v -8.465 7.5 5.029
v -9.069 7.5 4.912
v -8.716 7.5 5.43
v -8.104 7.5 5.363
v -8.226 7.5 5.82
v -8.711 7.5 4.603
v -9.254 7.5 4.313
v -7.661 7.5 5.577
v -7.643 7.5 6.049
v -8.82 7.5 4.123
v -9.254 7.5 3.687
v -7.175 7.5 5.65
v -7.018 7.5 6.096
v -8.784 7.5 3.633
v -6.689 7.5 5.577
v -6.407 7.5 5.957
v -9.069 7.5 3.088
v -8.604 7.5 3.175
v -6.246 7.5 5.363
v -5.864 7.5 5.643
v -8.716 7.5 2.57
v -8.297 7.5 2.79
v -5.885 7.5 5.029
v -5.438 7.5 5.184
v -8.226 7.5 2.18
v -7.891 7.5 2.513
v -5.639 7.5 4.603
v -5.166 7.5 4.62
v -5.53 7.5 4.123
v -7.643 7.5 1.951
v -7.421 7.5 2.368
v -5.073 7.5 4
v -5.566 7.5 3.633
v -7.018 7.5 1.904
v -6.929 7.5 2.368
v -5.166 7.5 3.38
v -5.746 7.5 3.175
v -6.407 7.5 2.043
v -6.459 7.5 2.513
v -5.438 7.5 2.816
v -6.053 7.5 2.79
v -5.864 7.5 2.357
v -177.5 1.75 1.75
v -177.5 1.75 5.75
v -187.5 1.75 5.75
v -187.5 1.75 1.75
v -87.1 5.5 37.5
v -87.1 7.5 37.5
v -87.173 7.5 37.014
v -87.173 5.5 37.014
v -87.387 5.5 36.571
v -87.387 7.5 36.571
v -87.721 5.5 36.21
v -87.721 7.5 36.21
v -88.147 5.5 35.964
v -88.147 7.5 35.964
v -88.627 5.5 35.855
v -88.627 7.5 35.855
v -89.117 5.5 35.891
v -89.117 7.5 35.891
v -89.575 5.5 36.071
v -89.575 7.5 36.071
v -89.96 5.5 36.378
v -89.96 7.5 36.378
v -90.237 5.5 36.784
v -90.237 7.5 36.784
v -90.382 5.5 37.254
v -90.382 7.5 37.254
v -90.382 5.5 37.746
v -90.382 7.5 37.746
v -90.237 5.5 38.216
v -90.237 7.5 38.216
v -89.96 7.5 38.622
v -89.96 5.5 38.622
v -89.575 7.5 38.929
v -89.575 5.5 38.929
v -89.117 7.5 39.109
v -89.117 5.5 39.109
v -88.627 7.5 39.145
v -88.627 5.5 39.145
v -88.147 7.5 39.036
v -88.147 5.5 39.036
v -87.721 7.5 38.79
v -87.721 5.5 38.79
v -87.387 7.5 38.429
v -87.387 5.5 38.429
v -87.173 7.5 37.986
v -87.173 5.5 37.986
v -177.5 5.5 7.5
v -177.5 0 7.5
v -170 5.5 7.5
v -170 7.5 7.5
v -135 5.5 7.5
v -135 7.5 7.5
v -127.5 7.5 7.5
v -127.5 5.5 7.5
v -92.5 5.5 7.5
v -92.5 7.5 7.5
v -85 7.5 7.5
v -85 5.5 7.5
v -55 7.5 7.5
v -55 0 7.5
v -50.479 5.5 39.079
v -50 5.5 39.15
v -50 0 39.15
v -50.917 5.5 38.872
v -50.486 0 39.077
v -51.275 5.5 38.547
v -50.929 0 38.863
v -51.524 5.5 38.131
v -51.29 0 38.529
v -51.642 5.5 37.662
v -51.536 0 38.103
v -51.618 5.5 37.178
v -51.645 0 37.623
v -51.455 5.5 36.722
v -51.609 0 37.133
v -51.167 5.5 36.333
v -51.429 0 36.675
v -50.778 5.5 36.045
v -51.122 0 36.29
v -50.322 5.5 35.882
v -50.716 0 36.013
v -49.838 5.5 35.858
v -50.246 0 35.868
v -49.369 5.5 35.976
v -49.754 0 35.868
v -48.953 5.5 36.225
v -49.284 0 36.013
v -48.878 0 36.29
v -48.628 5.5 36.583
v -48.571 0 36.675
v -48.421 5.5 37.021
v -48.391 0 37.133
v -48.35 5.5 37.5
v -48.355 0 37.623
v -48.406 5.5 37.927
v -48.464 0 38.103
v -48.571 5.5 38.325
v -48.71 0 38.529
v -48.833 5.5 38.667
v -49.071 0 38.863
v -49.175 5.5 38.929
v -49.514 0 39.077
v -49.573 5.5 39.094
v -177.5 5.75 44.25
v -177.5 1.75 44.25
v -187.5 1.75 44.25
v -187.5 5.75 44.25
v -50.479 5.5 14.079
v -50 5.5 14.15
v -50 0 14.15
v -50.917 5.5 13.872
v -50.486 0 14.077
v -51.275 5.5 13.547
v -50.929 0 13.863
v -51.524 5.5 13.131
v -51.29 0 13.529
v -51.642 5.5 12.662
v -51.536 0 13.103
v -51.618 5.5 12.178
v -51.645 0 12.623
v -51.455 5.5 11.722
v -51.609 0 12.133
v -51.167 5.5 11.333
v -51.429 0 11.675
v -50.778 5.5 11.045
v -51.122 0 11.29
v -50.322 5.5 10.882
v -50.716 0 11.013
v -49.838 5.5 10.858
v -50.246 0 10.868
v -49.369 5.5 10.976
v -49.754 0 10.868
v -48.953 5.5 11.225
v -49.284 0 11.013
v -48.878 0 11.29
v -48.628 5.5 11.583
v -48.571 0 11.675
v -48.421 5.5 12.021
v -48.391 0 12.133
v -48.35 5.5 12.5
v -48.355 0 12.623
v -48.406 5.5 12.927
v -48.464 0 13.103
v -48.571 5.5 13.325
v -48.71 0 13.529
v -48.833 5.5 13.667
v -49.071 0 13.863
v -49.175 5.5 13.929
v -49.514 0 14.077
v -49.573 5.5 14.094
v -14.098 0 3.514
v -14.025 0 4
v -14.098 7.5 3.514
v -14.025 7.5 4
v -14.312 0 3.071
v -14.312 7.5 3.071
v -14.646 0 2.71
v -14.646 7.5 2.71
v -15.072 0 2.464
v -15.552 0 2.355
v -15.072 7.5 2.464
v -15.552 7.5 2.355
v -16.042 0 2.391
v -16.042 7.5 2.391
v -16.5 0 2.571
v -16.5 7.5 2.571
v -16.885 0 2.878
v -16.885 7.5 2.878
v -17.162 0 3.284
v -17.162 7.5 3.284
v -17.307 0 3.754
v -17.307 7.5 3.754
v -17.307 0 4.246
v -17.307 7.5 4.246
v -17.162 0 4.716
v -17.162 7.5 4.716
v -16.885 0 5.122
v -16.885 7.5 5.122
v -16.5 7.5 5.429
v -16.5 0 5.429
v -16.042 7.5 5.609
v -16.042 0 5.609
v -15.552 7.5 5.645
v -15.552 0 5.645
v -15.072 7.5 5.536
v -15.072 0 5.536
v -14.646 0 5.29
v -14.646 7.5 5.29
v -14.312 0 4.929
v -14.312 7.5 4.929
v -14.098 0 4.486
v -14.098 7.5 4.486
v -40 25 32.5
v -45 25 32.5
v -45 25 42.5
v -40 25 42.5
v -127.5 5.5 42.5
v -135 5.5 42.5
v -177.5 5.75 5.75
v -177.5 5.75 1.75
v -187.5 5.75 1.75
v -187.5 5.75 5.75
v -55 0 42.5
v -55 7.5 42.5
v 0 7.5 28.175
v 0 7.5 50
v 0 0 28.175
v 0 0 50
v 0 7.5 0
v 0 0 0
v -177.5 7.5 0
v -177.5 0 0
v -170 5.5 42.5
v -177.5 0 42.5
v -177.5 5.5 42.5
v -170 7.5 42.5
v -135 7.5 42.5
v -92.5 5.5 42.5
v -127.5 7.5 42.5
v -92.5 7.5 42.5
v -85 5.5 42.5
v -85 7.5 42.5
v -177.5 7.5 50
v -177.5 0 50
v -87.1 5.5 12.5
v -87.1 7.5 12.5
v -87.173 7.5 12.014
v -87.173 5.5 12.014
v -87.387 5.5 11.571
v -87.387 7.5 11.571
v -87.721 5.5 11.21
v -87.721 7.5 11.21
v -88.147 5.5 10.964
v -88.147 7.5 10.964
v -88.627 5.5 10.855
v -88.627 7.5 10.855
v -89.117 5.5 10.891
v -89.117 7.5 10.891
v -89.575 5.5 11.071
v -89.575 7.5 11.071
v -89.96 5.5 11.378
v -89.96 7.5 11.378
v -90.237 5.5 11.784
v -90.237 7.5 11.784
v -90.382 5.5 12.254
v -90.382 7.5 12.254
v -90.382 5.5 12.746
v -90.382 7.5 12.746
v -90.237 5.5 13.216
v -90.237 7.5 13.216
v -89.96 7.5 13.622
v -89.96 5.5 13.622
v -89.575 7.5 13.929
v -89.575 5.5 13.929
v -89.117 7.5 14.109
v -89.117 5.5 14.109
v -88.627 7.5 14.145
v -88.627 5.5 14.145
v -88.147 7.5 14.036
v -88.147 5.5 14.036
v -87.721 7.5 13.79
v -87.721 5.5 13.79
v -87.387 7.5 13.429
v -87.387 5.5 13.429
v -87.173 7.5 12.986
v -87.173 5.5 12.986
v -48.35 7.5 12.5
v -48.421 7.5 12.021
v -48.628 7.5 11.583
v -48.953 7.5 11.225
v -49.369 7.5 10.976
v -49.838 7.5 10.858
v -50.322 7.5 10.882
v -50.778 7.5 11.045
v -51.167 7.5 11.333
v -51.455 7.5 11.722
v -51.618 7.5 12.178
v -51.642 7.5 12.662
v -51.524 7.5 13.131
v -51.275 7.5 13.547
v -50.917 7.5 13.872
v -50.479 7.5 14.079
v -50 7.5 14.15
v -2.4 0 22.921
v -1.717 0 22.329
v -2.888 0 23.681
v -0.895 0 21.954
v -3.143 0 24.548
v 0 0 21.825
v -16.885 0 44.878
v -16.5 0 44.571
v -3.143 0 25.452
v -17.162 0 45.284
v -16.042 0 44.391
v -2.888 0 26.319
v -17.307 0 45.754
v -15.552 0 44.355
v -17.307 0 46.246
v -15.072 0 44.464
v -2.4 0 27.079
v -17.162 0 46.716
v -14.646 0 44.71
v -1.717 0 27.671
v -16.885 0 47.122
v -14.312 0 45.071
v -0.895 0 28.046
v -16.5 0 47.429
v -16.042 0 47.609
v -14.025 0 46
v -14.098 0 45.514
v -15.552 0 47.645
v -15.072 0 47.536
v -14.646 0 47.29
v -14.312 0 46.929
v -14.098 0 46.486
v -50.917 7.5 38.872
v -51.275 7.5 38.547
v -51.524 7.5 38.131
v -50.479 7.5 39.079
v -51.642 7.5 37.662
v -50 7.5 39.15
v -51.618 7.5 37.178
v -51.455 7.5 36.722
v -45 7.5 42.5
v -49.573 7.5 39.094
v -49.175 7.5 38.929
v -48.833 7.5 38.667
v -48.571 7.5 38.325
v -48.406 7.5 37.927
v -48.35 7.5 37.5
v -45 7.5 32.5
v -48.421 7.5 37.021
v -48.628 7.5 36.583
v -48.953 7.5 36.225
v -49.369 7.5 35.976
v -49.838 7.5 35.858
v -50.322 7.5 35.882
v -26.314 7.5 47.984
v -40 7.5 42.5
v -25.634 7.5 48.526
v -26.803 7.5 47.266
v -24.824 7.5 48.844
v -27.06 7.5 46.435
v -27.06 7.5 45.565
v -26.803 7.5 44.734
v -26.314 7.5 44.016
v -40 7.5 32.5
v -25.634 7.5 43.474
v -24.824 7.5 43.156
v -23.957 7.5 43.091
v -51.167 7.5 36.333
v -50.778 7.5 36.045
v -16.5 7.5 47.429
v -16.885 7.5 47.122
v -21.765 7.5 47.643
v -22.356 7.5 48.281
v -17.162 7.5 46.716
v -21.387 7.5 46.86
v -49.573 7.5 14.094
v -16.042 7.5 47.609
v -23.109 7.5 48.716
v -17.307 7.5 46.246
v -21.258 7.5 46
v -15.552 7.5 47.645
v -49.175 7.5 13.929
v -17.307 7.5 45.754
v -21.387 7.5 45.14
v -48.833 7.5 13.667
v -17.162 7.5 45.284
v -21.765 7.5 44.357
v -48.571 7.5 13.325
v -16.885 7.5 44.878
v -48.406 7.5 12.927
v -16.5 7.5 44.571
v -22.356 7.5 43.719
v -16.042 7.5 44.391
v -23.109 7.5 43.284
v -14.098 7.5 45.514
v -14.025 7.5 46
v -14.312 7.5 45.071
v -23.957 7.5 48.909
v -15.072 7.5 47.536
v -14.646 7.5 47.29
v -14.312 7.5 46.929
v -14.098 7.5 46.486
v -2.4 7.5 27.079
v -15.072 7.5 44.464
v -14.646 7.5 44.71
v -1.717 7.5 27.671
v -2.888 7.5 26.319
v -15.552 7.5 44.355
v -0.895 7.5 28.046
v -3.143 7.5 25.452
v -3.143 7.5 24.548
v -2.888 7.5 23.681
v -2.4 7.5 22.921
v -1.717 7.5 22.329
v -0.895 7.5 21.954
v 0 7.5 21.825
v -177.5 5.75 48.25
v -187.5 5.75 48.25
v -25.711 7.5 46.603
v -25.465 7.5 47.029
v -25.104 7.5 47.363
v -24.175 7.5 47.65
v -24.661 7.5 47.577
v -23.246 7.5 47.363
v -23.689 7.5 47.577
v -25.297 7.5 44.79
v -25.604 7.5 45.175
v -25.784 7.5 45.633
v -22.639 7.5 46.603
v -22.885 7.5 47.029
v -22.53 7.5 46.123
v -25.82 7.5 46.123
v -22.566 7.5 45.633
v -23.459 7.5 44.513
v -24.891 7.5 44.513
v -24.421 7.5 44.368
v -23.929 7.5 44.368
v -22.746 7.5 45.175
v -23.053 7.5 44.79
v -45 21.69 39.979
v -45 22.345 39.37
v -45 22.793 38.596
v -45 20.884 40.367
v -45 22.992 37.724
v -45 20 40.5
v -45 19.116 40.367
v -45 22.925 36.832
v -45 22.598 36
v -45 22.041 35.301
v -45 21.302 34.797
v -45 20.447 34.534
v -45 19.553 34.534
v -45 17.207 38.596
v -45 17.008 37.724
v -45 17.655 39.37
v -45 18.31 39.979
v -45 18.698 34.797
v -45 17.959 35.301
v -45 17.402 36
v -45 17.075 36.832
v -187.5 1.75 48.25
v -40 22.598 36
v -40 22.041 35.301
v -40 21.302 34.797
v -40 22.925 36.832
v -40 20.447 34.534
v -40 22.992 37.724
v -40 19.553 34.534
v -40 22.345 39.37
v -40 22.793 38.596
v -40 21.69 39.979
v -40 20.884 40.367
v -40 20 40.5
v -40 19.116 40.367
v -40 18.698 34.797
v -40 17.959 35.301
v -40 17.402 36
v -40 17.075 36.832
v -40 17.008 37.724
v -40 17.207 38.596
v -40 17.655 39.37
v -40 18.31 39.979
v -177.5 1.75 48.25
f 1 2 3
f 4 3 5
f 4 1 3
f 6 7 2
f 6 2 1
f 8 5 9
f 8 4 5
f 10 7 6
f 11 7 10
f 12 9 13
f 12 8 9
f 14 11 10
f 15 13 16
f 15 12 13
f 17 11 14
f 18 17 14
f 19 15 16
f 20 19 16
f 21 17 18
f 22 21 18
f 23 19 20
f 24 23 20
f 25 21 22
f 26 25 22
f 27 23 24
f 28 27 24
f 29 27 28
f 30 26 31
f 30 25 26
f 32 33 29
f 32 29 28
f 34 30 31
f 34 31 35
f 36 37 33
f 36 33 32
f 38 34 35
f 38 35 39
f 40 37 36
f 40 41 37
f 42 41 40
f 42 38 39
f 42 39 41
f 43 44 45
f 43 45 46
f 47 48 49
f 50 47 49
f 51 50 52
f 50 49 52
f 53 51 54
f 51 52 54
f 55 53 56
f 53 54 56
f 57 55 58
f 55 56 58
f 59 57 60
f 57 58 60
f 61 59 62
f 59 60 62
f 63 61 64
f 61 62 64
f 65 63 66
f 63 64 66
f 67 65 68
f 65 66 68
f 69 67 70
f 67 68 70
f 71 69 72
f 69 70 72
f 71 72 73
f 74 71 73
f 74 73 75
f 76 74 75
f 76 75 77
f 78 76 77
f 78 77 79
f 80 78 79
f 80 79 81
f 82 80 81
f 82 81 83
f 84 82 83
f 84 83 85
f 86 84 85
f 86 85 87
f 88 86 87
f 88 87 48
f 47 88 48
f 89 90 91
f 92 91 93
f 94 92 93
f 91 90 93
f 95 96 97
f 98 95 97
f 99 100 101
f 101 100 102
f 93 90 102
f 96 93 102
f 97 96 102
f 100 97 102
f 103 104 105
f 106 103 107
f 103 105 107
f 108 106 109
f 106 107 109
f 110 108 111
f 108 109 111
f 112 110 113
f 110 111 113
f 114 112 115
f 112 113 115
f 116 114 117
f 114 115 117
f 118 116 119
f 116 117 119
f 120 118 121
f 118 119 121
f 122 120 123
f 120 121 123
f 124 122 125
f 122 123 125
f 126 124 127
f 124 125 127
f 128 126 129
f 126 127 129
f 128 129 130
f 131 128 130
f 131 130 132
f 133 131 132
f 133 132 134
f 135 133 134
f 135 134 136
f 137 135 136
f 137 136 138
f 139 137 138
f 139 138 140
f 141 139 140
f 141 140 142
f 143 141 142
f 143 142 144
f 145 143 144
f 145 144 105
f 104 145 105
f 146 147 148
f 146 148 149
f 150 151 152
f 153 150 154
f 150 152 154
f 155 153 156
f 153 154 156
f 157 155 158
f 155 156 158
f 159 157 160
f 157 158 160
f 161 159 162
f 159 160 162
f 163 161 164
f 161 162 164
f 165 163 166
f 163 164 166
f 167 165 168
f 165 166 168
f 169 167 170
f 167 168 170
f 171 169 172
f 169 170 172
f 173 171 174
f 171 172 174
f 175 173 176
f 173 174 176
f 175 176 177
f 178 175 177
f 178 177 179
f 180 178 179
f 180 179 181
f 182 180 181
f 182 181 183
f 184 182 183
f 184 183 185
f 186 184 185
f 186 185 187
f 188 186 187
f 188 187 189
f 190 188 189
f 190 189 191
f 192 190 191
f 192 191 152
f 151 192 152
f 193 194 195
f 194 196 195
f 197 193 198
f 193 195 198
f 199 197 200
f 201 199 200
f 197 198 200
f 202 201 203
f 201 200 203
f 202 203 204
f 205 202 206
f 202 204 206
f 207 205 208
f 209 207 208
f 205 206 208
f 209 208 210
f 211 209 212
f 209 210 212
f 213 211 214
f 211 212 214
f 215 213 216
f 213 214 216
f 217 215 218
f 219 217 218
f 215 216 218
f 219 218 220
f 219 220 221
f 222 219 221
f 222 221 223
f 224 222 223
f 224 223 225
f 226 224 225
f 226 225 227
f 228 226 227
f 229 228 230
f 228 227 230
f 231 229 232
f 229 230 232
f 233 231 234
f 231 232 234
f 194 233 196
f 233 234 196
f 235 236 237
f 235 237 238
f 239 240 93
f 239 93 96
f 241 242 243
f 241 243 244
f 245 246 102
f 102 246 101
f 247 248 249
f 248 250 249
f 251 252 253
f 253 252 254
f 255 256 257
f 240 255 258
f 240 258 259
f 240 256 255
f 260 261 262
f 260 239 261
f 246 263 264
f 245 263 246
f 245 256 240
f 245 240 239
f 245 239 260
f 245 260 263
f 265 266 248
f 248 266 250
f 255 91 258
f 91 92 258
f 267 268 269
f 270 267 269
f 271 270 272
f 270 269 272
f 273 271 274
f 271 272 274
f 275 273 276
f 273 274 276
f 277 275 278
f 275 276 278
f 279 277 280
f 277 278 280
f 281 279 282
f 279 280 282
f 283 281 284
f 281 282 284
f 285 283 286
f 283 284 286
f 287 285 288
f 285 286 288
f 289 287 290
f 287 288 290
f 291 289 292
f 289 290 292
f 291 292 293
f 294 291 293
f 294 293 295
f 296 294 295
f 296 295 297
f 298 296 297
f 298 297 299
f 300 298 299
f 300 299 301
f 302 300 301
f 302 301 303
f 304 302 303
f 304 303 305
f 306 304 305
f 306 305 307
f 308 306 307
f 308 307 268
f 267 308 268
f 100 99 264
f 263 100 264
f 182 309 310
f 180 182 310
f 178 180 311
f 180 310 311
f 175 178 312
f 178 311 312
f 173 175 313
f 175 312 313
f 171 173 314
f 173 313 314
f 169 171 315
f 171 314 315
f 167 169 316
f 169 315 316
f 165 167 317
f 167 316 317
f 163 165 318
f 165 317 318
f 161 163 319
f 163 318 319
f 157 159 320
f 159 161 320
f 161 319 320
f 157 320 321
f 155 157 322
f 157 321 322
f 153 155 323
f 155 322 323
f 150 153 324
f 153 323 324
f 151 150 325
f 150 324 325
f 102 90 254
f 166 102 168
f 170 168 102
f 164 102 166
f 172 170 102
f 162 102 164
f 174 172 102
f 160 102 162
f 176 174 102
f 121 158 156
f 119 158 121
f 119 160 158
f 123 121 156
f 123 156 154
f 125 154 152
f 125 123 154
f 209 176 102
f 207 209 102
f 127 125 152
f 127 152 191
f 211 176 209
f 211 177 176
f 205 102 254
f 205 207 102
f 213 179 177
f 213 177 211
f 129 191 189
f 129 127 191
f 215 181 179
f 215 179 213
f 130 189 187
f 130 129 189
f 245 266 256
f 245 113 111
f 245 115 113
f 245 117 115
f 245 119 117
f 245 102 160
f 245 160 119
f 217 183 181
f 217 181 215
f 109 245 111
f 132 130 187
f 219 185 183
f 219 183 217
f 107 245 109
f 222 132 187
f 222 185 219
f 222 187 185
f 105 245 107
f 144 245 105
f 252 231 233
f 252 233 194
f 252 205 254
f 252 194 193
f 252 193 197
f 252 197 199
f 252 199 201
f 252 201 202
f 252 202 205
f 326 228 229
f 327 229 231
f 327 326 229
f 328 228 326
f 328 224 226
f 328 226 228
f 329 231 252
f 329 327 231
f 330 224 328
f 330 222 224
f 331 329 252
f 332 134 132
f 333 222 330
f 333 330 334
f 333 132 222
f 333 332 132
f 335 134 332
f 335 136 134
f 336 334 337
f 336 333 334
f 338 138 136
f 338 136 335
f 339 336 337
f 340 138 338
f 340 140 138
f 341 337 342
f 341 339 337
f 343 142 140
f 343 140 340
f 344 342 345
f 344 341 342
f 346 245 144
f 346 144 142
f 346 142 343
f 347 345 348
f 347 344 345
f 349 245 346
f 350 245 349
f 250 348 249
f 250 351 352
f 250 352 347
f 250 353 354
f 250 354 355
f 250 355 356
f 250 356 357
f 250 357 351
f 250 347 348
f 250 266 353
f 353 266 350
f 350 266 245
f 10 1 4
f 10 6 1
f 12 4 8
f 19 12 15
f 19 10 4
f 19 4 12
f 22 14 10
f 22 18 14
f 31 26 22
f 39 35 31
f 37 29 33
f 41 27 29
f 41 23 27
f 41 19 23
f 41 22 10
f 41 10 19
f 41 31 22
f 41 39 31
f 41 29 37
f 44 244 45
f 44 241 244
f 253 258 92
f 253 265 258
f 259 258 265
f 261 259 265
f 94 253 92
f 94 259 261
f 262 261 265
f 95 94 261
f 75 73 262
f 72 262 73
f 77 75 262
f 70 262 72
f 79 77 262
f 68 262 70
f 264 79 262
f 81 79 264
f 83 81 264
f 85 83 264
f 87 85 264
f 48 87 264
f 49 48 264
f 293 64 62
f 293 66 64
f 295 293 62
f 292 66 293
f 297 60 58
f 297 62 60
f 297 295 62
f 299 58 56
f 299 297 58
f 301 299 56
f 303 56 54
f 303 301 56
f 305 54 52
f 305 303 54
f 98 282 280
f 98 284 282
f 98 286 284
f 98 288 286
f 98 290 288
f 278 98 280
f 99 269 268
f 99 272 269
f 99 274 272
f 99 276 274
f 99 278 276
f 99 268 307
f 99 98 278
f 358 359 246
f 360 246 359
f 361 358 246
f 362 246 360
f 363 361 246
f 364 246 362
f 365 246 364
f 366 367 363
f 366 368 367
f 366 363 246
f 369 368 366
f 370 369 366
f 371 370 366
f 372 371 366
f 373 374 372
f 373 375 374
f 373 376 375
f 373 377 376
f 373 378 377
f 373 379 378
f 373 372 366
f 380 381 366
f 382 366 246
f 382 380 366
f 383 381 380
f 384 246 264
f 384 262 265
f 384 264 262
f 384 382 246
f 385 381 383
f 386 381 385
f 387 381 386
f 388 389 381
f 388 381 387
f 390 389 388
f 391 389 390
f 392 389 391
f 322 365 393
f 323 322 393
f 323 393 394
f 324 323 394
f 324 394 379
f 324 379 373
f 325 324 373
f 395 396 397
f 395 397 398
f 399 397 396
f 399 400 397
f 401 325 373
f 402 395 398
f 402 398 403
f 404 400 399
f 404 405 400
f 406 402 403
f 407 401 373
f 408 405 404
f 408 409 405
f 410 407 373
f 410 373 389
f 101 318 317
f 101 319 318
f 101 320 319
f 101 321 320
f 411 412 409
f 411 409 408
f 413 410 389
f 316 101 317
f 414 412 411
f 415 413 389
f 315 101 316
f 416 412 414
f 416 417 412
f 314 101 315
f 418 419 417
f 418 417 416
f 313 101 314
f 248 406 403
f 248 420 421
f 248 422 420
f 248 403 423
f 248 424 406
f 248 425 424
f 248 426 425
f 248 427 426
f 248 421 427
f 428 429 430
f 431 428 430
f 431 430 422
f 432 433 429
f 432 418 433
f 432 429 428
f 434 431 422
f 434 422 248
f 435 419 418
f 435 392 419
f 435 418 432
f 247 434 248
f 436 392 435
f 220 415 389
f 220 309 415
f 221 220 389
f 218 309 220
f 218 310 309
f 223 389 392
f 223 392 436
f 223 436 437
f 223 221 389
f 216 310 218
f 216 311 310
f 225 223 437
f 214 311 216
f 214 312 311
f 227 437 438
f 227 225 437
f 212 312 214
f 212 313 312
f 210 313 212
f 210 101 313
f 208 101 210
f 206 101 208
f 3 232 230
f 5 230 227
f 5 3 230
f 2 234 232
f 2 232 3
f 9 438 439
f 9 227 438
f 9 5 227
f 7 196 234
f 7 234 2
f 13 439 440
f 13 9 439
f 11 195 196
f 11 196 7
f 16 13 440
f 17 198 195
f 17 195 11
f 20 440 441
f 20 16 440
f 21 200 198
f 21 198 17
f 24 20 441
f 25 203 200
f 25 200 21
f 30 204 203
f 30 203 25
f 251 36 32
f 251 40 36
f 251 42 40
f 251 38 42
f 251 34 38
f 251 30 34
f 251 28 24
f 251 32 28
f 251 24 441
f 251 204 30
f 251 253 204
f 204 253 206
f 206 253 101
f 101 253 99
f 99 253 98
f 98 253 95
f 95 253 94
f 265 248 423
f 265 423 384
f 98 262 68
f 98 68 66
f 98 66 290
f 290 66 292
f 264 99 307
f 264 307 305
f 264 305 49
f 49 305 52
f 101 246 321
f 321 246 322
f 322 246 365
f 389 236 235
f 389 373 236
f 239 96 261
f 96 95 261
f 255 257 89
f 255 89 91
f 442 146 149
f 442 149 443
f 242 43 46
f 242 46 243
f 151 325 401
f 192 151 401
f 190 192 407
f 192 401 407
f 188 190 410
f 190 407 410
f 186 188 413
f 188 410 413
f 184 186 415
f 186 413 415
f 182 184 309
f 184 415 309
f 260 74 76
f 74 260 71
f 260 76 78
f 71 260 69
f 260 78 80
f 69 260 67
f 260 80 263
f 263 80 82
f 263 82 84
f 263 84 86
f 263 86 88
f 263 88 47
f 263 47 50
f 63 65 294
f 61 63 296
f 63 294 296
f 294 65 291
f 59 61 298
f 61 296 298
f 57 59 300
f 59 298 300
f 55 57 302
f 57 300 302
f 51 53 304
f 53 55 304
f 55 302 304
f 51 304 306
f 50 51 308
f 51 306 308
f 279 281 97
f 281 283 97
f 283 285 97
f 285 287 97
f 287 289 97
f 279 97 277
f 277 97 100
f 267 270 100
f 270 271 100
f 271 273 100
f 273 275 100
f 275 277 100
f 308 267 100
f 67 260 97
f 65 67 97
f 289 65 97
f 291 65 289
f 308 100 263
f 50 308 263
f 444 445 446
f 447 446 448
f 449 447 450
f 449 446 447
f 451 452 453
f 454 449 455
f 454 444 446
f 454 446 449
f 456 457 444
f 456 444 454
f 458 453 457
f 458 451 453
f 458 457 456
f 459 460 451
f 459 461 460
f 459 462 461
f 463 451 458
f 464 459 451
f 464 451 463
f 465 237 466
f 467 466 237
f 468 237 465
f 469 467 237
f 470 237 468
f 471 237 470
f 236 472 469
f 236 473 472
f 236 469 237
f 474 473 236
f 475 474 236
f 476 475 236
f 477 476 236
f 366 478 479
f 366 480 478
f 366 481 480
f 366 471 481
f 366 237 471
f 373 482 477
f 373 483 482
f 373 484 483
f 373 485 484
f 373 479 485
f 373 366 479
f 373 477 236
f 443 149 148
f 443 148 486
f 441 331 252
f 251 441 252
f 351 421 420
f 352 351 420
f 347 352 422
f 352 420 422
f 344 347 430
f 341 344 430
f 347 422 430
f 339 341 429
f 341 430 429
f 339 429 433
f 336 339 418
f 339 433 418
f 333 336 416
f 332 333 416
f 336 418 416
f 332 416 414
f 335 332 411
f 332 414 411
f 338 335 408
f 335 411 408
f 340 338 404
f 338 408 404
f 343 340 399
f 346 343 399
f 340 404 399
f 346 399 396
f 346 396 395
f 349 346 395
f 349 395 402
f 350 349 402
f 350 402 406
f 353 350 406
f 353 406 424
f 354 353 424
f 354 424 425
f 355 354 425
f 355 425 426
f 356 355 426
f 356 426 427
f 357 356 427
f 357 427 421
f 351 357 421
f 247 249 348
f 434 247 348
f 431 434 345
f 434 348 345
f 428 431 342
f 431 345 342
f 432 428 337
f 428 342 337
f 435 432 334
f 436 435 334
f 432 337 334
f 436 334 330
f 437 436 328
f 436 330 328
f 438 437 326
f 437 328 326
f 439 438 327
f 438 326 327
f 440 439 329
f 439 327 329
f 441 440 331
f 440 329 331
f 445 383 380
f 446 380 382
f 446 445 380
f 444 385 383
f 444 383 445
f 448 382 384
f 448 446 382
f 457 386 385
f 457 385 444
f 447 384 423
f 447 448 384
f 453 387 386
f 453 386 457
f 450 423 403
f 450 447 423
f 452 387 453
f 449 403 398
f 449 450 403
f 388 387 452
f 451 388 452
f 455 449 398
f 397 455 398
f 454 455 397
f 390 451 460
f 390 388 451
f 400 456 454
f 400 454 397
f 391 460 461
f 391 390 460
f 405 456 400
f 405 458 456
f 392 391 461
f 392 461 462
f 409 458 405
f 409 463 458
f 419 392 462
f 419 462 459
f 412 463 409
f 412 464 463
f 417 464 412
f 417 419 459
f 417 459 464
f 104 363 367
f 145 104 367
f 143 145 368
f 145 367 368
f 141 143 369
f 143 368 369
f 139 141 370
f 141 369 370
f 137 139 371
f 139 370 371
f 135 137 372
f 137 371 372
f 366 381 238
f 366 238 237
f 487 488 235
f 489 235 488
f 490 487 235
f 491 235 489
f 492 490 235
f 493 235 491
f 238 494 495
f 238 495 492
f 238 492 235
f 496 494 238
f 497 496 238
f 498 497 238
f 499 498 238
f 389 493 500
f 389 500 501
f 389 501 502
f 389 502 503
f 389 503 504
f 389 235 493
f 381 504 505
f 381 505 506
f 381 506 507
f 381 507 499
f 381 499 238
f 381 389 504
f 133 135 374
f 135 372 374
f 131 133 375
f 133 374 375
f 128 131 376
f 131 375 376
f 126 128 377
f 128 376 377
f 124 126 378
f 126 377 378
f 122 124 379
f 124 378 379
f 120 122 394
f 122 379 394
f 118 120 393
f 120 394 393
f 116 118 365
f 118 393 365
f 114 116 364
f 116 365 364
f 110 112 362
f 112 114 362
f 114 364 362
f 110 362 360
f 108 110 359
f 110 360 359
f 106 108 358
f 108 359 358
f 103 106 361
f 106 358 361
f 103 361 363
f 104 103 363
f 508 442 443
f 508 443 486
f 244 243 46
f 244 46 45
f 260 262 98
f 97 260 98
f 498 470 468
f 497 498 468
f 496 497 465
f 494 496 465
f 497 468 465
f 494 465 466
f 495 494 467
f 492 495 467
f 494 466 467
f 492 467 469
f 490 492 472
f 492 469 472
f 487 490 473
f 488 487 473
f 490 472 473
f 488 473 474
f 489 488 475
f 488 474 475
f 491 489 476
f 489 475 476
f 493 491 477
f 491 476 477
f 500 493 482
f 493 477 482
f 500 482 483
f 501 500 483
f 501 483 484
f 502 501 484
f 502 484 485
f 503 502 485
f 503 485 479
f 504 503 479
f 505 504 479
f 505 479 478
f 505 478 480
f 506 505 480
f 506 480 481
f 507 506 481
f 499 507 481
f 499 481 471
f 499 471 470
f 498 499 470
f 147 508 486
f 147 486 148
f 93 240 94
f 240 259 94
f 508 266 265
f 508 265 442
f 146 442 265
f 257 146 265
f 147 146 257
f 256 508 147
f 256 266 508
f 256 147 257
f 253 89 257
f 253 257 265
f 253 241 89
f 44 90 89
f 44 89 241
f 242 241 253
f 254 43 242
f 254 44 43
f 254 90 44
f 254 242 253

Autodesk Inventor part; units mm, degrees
ref_plane "YZ Plane" through (0, 0, 0) normal (1, 0, 0) x (0, 1, 0)
ref_plane "XZ Plane" through (0, 0, 0) normal (0, 1, 0) x (-1, 0, 0)
ref_plane "XY Plane" through (0, 0, 0) normal (0, 0, 1) x (1, 0, 0)
sketch "Sketch1" plane through (0, 0, 0) normal (0, 1, 0) x (-1, 0, 0)
  line L0 (0, 0) -> (50, 0)
  line L1 (50, 0) -> (50, 50)
  line L2 (50, 50) -> (0, 50)
  line L3 (0, 50) -> (0, 0)
  line L4 (50, 50) -> (290, 50)
  line L5 (290, 50) -> (290, 42.5)
  line L6 (290, 42.5) -> (50, 42.5)
  line L7 (50, 42.5) -> (50, 50)
  line L8 (50, 0) -> (290, 0)
  line L9 (290, 0) -> (290, 7.5)
  line L10 (290, 7.5) -> (50, 7.5)
  line L11 (50, 7.5) -> (50, 0)
  dimension "d0" = 50
  dimension "d1" = 50
  dimension "d2" = 240
  dimension "d3" = 7.5
  dimension "d4" = 7.5
extrude "Extrusion1" add sketch "Sketch1" along normal blind 7.5
sketch "Sketch2" plane through (0, 7.5, 0) normal (0, 1, 0) x (1, 0, 0)
  line L0 (0, -50) -> (0, 0) projected
  point P0 (0, -25)
hole "Hole1" at (0, 7.5, 25) direction (0, -1, 0) diameter 6.35 end through all
sketch "Sketch3" plane through (0, 7.5, 0) normal (0, 1, 0) x (1, 0, 0)
  line L0 (-3.175, -50) -> (-3.175, 0) construction
  line L1 (-3.175, -50) -> (-28.175, -50) construction
  line L2 (-28.175, -50) -> (-28.175, 0) construction
  line L3 (-28.175, 0) -> (-3.175, 0) construction
  point P0 (0, 0)
  point P1 (-7.175, -4)
  point P2 (-24.175, -46)
  dimension "d14" = 25
hole "Hole2" at (-7.175, 7.5, 4) at (-24.175, 7.5, 46) direction (0, -1, 0) diameter 3.3 end through all
sketch "Sketch4" plane through (0, 7.5, 0) normal (0, 1, 0) x (1, 0, 0)
  arc A0 (0, -21.825) -> (0, -28.175) centre (0, -25) ccw construction
  line L0 (-3.175, -25) -> (-28.175, -25) construction
  line L1 (-3.175, -25) -> (21.825, -25) construction
  line L2 (-290, -50) -> (0, -50) construction
  line L3 (-28.175, -50) -> (-28.175, 0) construction
  line L4 (-50, -7.5) -> (-50, -42.5) construction
  line L5 (-50, -42.5) -> (-45, -42.5) construction
  line L6 (-45, -42.5) -> (-45, -32.5) construction
  line L7 (-45, -32.5) -> (-50, -32.5) construction
  line L8 (-50, -32.5) -> (-50, -42.5) construction
  line L9 (-45, -32.5) -> (-40, -32.5)
  line L10 (-40, -32.5) -> (-40, -42.5)
  line L11 (-40, -42.5) -> (-45, -42.5)
  line L12 (-45, -42.5) -> (-45, -32.5)
  point P0 (0, 0)
  dimension "d22" = 25
  dimension "d23" = 180
  dimension "d24" = 5
  dimension "d25" = 10
  dimension "d26" = 5
extrude "Extrusion2" add sketch "Sketch4" along normal blind 17.5
sketch "Sketch5" plane through (0, 7.5, 0) normal (0, 1, 0) x (1, 0, 0)
  line L0 (-85, -7.5) -> (-85, -42.5)
  line L1 (-127.5, -7.5) -> (-127.5, -42.5)
  line L2 (-92.5, -42.5) -> (-92.5, -7.5)
  line L3 (-135, -7.5) -> (-170, -7.5) construction
  line L4 (-170, -7.5) -> (-170, -42.5) construction
  line L5 (-170, -42.5) -> (-135, -42.5) construction
  line L6 (-135, -42.5) -> (-135, -7.5) construction
  line L7 (-177.5, -7.5) -> (-212.5, -7.5) construction
  line L8 (-212.5, -7.5) -> (-212.5, -42.5) construction
  line L9 (-212.5, -42.5) -> (-177.5, -42.5) construction
  line L10 (-177.5, -42.5) -> (-177.5, -7.5) construction
  line L11 (-220, -7.5) -> (-255, -7.5) construction
  line L12 (-255, -7.5) -> (-255, -42.5) construction
  line L13 (-255, -42.5) -> (-220, -42.5) construction
  line L14 (-220, -42.5) -> (-220, -7.5) construction
  line L15 (-85, -7.5) -> (-92.5, -7.5) construction
  line L16 (-92.5, -7.5) -> (-92.5, -42.5) construction
  line L17 (-92.5, -42.5) -> (-85, -42.5) construction
  line L18 (-85, -42.5) -> (-85, -7.5) construction
  line L19 (-127.5, -7.5) -> (-135, -7.5) construction
  line L20 (-135, -7.5) -> (-135, -42.5) construction
  line L21 (-135, -42.5) -> (-127.5, -42.5) construction
  line L22 (-127.5, -42.5) -> (-127.5, -7.5) construction
  line L23 (-170, -7.5) -> (-177.5, -7.5) construction
  line L24 (-177.5, -7.5) -> (-177.5, -42.5) construction
  line L25 (-177.5, -42.5) -> (-170, -42.5) construction
  line L26 (-170, -42.5) -> (-170, -7.5) construction
  line L27 (-212.5, -7.5) -> (-220, -7.5) construction
  line L28 (-220, -7.5) -> (-220, -42.5) construction
  line L29 (-220, -42.5) -> (-212.5, -42.5) construction
  line L30 (-212.5, -42.5) -> (-212.5, -7.5) construction
  line L31 (-220, -7.5) -> (-212.5, -7.5)
  line L32 (-212.5, -7.5) -> (-212.5, -42.5)
  line L33 (-212.5, -42.5) -> (-220, -42.5)
  line L34 (-220, -42.5) -> (-220, -7.5)
  line L35 (-177.5, -7.5) -> (-170, -7.5)
  line L36 (-170, -7.5) -> (-170, -42.5)
  line L37 (-170, -42.5) -> (-177.5, -42.5)
  line L38 (-177.5, -42.5) -> (-177.5, -7.5)
  line L39 (-135, -7.5) -> (-127.5, -7.5)
  line L40 (-127.5, -7.5) -> (-127.5, -42.5)
  line L41 (-127.5, -42.5) -> (-135, -42.5)
  line L42 (-135, -42.5) -> (-135, -7.5)
  line L43 (-92.5, -7.5) -> (-85, -7.5)
  line L44 (-85, -7.5) -> (-85, -42.5)
  line L45 (-85, -42.5) -> (-92.5, -42.5)
  line L46 (-92.5, -42.5) -> (-92.5, -7.5)
  point P0 (0, 0)
  point P1 (-50, -7.5)
  dimension "d30" = 35
  dimension "d31" = 35
  dimension "d32" = 35
  dimension "d33" = 35
  dimension "d34" = 35
  dimension "d35" = 35
extrude "Extrusion3" add sketch "Sketch5" against normal blind 2
sketch "Sketch6" plane through (0, 7.5, 0) normal (0, 1, 0) x (1, 0, 0)
  line L0 (-290, 0) -> (-290, -7.5) projected
  line L1 (-290, -50) -> (0, -50) projected
  line L2 (-290, 0) -> (-280, 0)
  line L3 (-280, 0) -> (-280, -50)
  line L4 (-280, -50) -> (-290, -50)
  line L5 (-290, -50) -> (-290, 0)
  point P0 (0, 0)
  dimension "d38" = 10
extrude "Extrusion4" cut sketch "Sketch6" against normal blind 7.5
sketch "Sketch7" plane through (-280, 7.5, 0) normal (-1, 0, 0) x (0, 0, 1)
  point P0 (0, -7.5)
sketch "Sketch8" plane through (-280, 7.5, 0) normal (-1, 0, 0) x (0, 0, 1)
  line L0 (-25, 0) -> (75, 0)
  line L1 (75, 0) -> (75, -7.5)
  line L2 (75, -7.5) -> (-25, -7.5)
  line L3 (-25, -7.5) -> (-25, 0)
  line L4 (-25, 0) -> (75, 0)
  line L5 (75, 0) -> (75, -10)
  line L6 (75, -10) -> (-25, -10)
  line L7 (-25, -10) -> (-25, 0)
  point P0 (0, -7.5)
  dimension "d41" = 100
  dimension "d42" = 10
extrude "Extrusion5" add sketch "Sketch8" along normal blind 7.5
sketch "Sketch9" plane through (-287.5, 7.5, 0) normal (-1, 0, 0) x (0, 0, 1)
  line L0 (75, 0) -> (-25, 0) projected
  line L1 (-25, -10) -> (75, -10) projected
  line L2 (-25, 0) -> (-17.5, 0)
  line L3 (-17.5, 0) -> (-17.5, -10)
  line L4 (-17.5, -10) -> (-25, -10)
  line L5 (-25, -10) -> (-25, 0)
  line L6 (75, 0) -> (67.5, 0)
  line L7 (67.5, 0) -> (67.5, -10)
  line L8 (67.5, -10) -> (75, -10)
  line L9 (75, -10) -> (75, 0)
  point P0 (0, -7.5)
  dimension "d45" = 7.5
  dimension "d46" = 7.5
extrude "Extrusion6" add sketch "Sketch9" along normal blind 25 contours L9 L1 L7 L0 | L3 L1 L5 L0
sketch "Sketch10" plane through (-287.5, -2.5, -17.5) normal (0, 0, 1) x (1, 0, 0)
  line L0 (0, 0) -> (-25, 0) construction
  line L1 (0, 0) -> (-3, 0) construction
  line L2 (-3, 0) -> (-6.2, 0)
  line L3 (-6.2, 0) -> (-6.2, 2.1)
  line L4 (-6.2, 2.1) -> (-3, 2.1)
  line L5 (-3, 2.1) -> (-3, 0)
  line L6 (-6.2, 2.1) -> (-11.7, 2.1) construction
  line L7 (-11.7, 2.1) -> (-11.7, 5.4) construction
  point P0 (287.5, 2.5)
  dimension "d49" = 3
  dimension "d50" = 3.2
  dimension "d51" = 2.1
  dimension "d52" = 5.5
  dimension "d53" = 3.3
extrude "Extrusion7" add sketch "Sketch10" along normal blind 92.5
sketch "Sketch11" plane through (-287.5, -2.5, -17.5) normal (0, 0, 1) x (1, 0, 0)
  line L0 (-6.2, 2.1) -> (-3, 2.1) construction
  line L1 (-6.2, 2.1) -> (-11.7, 2.1) construction
  line L2 (-11.7, 2.1) -> (-11.7, 5.4) construction
  circle A0 centre (-11.7, 5.4) radius 2.125
  point P0 (287.5, 2.5)
  dimension "d56" = 5.5
  dimension "d57" = 3.3
  dimension "d58" = 4.25
extrude "Extrusion8" cut sketch "Sketch11" along normal mid plane 241
sketch "Sketch12" plane through (-287.5, -2.5, -17.5) normal (0, 0, 1) x (1, 0, 0)
  circle A0 centre (-11.7, 5.4) radius 2.125 construction
  line L0 (-11.7, 5.4) -> (-11.7, 0.96) construction
  line L1 (-11.7, 0.96) -> (-16.7, 0.96) construction
  line L2 (-6.2, 0) -> (-25, 0) projected
  line L3 (-16.7, 0.96) -> (-19.2, 0.96)
  line L4 (-19.2, 0.96) -> (-19.2, 0)
  line L5 (-19.2, 0) -> (-16.7, 0)
  line L6 (-16.7, 0) -> (-16.7, 0.96)
  point P0 (287.5, 2.5)
  dimension "d61" = 4.44
  dimension "d62" = 5
  dimension "d63" = 2.5
extrude "Extrusion9" add sketch "Sketch12" along normal blind 91.25
sketch "Sketch13" plane through (-293.7, -0.4, -17.5) normal (0, 1, 0) x (1, 0, 0)
  line L0 (3.2, 0) -> (3.2, -85) construction
  line L1 (3.2, 0) -> (3.2, -30) construction
  line L2 (0, 0) -> (0, -85) construction
  line L3 (3.2, -30) -> (0, -30) construction
  line L4 (0, -30) -> (0, -36.35) construction
  line L5 (0, -36.35) -> (3.2, -36.35) construction
  line L6 (3.2, -36.35) -> (3.2, -30) construction
  line L7 (0, -30) -> (3.2, -30)
  line L8 (3.2, -30) -> (3.2, -36.35)
  line L9 (3.2, -36.35) -> (0, -36.35)
  line L10 (0, -36.35) -> (0, -30)
  point P0 (293.7, -17.5)
  dimension "d66" = 30
  dimension "d67" = 6.35
extrude "Extrusion10" add sketch "Sketch13" along normal blind 3.8
sketch "Sketch14" plane through (0, 7.5, 0) normal (0, 1, 0) x (1, 0, 0)
  line L0 (-287.5, 17.5) -> (-287.5, -67.5) projected
  line L1 (-287.5, 17.5) -> (-285, 17.5)
  line L2 (-285, 17.5) -> (-285, -67.5)
  line L3 (-285, -67.5) -> (-287.5, -67.5)
  line L4 (-287.5, -67.5) -> (-287.5, 17.5)
  point P0 (0, 0)
  dimension "d70" = 2.5
extrude "Extrusion11" cut sketch "Sketch14" against normal blind 14.55
sketch "Sketch15" plane through (0, 7.5, 0) normal (0, 1, 0) x (1, 0, 0)
  line L0 (-312.5, 17.5) -> (-312.5, 25) projected
  line L1 (-280, -75) -> (-312.5, -75) projected
  line L2 (-312.5, 25) -> (-306.6488, 25)
  line L3 (-306.6488, 25) -> (-306.6488, -75)
  line L4 (-306.6488, -75) -> (-312.5, -75)
  line L5 (-312.5, -75) -> (-312.5, 25)
  point P0 (0, 0)
extrude "Extrusion12" cut sketch "Sketch15" against normal blind 14.55
fillet "Fillet1" radius 0.1 1 edges at (-301.325, 2.9, -17.5)
fillet "Fillet2" radius 0.1 1 edges at (-301.325, 2.9, 67.5)
fillet "Fillet3" radius 3.25 1 edges at (-280, 2.5, 75)
fillet "Fillet4" radius 3.25 1 edges at (-285, 2.5, 67.5)
fillet "Fillet5" radius 3.25 1 edges at (-280, 2.5, -25)
fillet "Fillet6" radius 3.25 1 edges at (-285, 2.5, -17.5)
sketch "Sketch16" plane through (0, 7.5, 0) normal (0, 1, 0) x (1, 0, 0)
  line L0 (-220, -42.5) -> (-220, -7.5) construction
  line L1 (-220, -42.5) -> (-280, -42.5) construction
  line L2 (-220, -7.5) -> (-255, -7.5) construction
  line L3 (-255, -7.5) -> (-255, -42.5) construction
  line L4 (-255, -42.5) -> (-220, -42.5) construction
  line L5 (-220, -42.5) -> (-220, -7.5) construction
  line L6 (-280, -7.5) -> (-280, 0) projected
  line L7 (-280, -7.5) -> (-270, -7.5)
  line L8 (-270, -7.5) -> (-270, -42.5)
  line L9 (-270, -42.5) -> (-280, -42.5)
  line L10 (-280, -42.5) -> (-280, -7.5)
  point P0 (0, 0)
  dimension "d81" = 35
  dimension "d82" = 10
extrude "Extrusion13" add sketch "Sketch16" against normal blind 2
sketch "Sketch17" plane through (0, 7.5, 0) normal (0, 1, 0) x (1, 0, 0)
  point P0 (0, 0)
sketch "Sketch18" plane through (0, 7.5, 0) normal (0, 1, 0) x (1, 0, 0)
  line L0 (-270, -7.5) -> (-270, -42.5) construction
  line L1 (-285, -64.25) -> (-285, 14.25) construction
  line L2 (-280, -7.5) -> (-280, 0) construction
  line L3 (-270, -7.5) -> (-280, -7.5) construction
  line L4 (-275, -7.5) -> (-275, -42.5) construction
  line L5 (-50, -42.5) -> (-280, -42.5) construction
  circle A0 centre (-275, -12.5) radius 1.8 construction
  circle A1 centre (-275, -37.5) radius 1.8 construction
  circle A2 centre (-275, -12.5) radius 1.8
  circle A3 centre (-275, -37.5) radius 1.8
  point P0 (0, 0)
  dimension "d85" = 3.6
  dimension "d86" = 3.6
hole "Hole3" at (-275, 7.5, 12.5) at (-275, 7.5, 37.5) direction (0, -1, 0) diameter 3.3 depth 15 tip angle 118
sketch "Sketch19" plane through (0, 7.5, 0) normal (0, 1, 0) x (1, 0, 0)
  circle A0 centre (-275, -12.5) radius 1.65 construction
  line L0 (-275, -12.5) -> (-212.5, -12.5) construction
  line L1 (-212.5, -7.5) -> (-212.5, -42.5) construction
  circle A1 centre (-275, -37.5) radius 1.65 construction
  line L2 (-275, -37.5) -> (-212.5, -37.5) construction
  line L3 (-220, -42.5) -> (-220, -7.5) construction
  line L4 (-220, -12.5) -> (-212.5, -12.5) construction
  line L5 (-216.25, -12.5) -> (-216.25, -37.5) construction
  point P0 (0, 0)
hole "Hole4" at (-216.25, 7.5, 12.5) at (-216.25, 7.5, 37.5) direction (0, -1, 0) diameter 3.3 depth 15 tip angle 118
sketch "Sketch20" plane through (-45, 7.5, 32.5) normal (-1, 0, 0) x (0, 0, 1)
  line L0 (10, 17.5) -> (0, 17.5) construction
  line L1 (5, 17.5) -> (5, -0.1335) construction
  line L2 (10, 0) -> (10, 17.5) construction
  line L3 (10, 12.5) -> (5, 12.5) construction
  circle A0 centre (5, 12.5) radius 3
  point P0 (-32.5, -7.5)
  dimension "d101" = 6
extrude "Extrusion14" cut sketch "Sketch20" against normal blind 20
sketch "Sketch21" plane through (0, 7.5, 0) normal (0, 1, 0) x (1, 0, 0)
  line L0 (-306.6488, 17.5) -> (-306.6488, -67.5) projected
  line L1 (-306.6488, 17.5) -> (-288.25, 17.5) projected
  line L2 (-306.6488, -67.5) -> (-288.25, -67.5)
  line L3 (-288.25, -67.5) -> (-288.25, 17.5)
  line L4 (-288.25, 17.5) -> (-306.6488, 17.5)
  line L5 (-306.6488, 17.5) -> (-306.6488, -67.5)
  point P0 (0, 0)
extrude "Extrusion15" cut sketch "Sketch21" against normal blind 10
sketch "Sketch22" plane through (0, 7.5, 0) normal (0, 1, 0) x (1, 0, 0)
  line L0 (-280, -50) -> (0, -50) projected
  line L1 (0, 0) -> (-280, 0) projected
  line L2 (-280, -50) -> (-270.5687, -50)
  line L3 (-270.5687, -50) -> (-270.5687, 0)
  line L4 (-270.5687, 0) -> (-280, 0)
  line L5 (-280, 0) -> (-280, -50)
  line L6 (-50, -42.5) -> (-280, -42.5) projected
  line L7 (-219.3019, -42.5) -> (-213.3073, -42.5)
  line L8 (-213.3073, -42.5) -> (-213.3073, -8.284)
  line L9 (-213.3073, -8.284) -> (-219.3019, -8.284)
  line L10 (-219.3019, -8.284) -> (-219.3019, -42.5)
extrude "Extrusion16" add sketch "Sketch22" against normal blind 2
sketch "Sketch23" plane through (-306.6488, -2.5, -25) normal (0, 0, -1) x (-1, 0, 0)
  circle A0 centre (-7.4488, 5.4) radius 2.125 projected
  circle A1 centre (-7.4488, 5.4) radius 2
  circle A2 centre (-7.4488, 5.4) radius 2.4429
  point P0 (-306.6488, 2.5)
  dimension "d108" = 4
extrude "Extrusion17" add sketch "Sketch23" against normal blind 100 contours A0 | A2
sketch "Sketch24" plane through (0, 7.5, 0) normal (0, 1, 0) x (1, 0, 0)
  line L0 (-288.25, -67.5) -> (-306.6488, -67.5) projected
  arc A0 (-285, 14.25) -> (-288.25, 17.5) centre (-288.25, 14.25) ccw projected
  line L1 (-306.6488, -67.5) -> (-288.25, -67.5)
  line L2 (-288.25, -67.5) -> (-288.25, 17.5)
  line L3 (-288.25, 17.5) -> (-306.6488, 17.5)
  line L4 (-306.6488, 17.5) -> (-306.6488, -67.5)
  point P0 (0, 0)
extrude "Extrusion18" cut sketch "Sketch24" against normal blind 100
sketch "Sketch25" plane through (0, 7.5, 0) normal (0, 1, 0) x (1, 0, 0)
  line L0 (-50, -42.5) -> (-280, -42.5) projected
  line L1 (-280, -7.5) -> (-50, -7.5) projected
  line L2 (-50, -42.5) -> (-55, -42.5)
  line L3 (-55, -42.5) -> (-55, -7.5)
  line L4 (-55, -7.5) -> (-50, -7.5)
  line L5 (-50, -7.5) -> (-50, -42.5)
  point P0 (0, 0)
  dimension "d113" = 5
extrude "Extrusion19" add sketch "Sketch25" against normal blind 2
sketch "Sketch26" plane through (0, 7.5, 0) normal (0, 1, 0) x (1, 0, 0)
  line L0 (-55, -42.5) -> (-85, -42.5) construction
  line L1 (-55, -42.5) -> (-50, -42.5) construction
  line L2 (-55, -42.5) -> (-50, -42.5) construction
  line L3 (-50, -42.5) -> (-50, -7.5) construction
  line L4 (-50, -42.5) -> (-50, -7.5) construction
  circle A0 centre (-50, -37.5) radius 1.65 construction
  circle A1 centre (-50, -12.5) radius 1.65 construction
  circle A2 centre (-50, -37.5) radius 1.65
  circle A3 centre (-50, -12.5) radius 1.65
  line L5 (-50, -37.5) -> (-92.5, -37.5) construction
  line L6 (-92.5, -42.5) -> (-92.5, -7.5) construction
  line L7 (-50, -12.5) -> (-92.5, -12.5) construction
  line L8 (-92.5, -37.5) -> (-85, -37.5) construction
  line L9 (-85, -7.5) -> (-85, -42.5) construction
  line L10 (-88.75, -37.5) -> (-88.75, -12.5) construction
  circle A4 centre (-88.75, -37.5) radius 1.65
  circle A5 centre (-88.75, -12.5) radius 1.65
  point P0 (0, 0)
  dimension "d116" = 3.3
  dimension "d117" = 3.3
  dimension "d118" = 3.3
  dimension "d119" = 3.3
extrude "Extrusion20" cut sketch "Sketch26" against normal blind 2
sketch "Sketch27" plane through (0, 5.5, 0) normal (0, -1, 0) x (1, 0, 0)
  line L0 (-50, 7.5) -> (-55, 7.5) projected
  line L1 (-55, 7.5) -> (-46.6169, 7.5)
  line L2 (-46.6169, 7.5) -> (-46.6169, 42.5)
  line L3 (-46.6169, 42.5) -> (-55, 42.5)
  line L4 (-55, 42.5) -> (-55, 7.5)
  point P0 (0, 0)
extrude "Extrusion21" add sketch "Sketch27" along normal blind 5.5
sketch "Sketch28" plane through (0, 7.5, 0) normal (0, 1, 0) x (1, 0, 0)
  circle A0 centre (-50, -12.5) radius 1.65 projected
  circle A1 centre (-50, -37.5) radius 1.65 projected
  point P0 (0, 0)
hole "Hole5" at (-50, 7.5, 12.5) at (-50, 7.5, 37.5) direction (0, -1, 0) diameter 3.3 depth 8 tip angle 118
sketch "Sketch29" plane through (0, 7.5, 0) normal (0, 1, 0) x (1, 0, 0)
  circle A0 centre (-7.175, -4) radius 1.65 construction
  circle A1 centre (-24.175, -46) radius 1.65 construction
  line L0 (-7.175, -4) -> (-24.175, -46) construction
  line L1 (-7.175, -4) -> (-7.175, -46) construction
  line L2 (-7.175, -46) -> (-24.175, -46) construction
  line L3 (-7.175, -25) -> (-25.825, -25) construction
  line L4 (-25.825, -25) -> (-25.825, -46) construction
  line L5 (-16.5, -25) -> (-25.825, -25) construction
  line L6 (-24.175, -46) -> (-24.175, -25) construction
  line L7 (-15.675, -46) -> (-15.675, -4) construction
  line L8 (-40, -32.5) -> (-40, -42.5) construction
  line L9 (-40, -42.5) -> (-24.175, -42.5) construction
  line L10 (-24.175, -42.5) -> (-24.175, -46) construction
  line L11 (-15.675, -25) -> (-15.675, -46) construction
  line L12 (-15.675, -46) -> (-15.675, -4) construction
  circle A2 centre (-15.675, -46) radius 1.65 construction
  circle A3 centre (-15.675, -46) radius 1.65
  circle A4 centre (-15.675, -4) radius 1.65
  point P0 (0, 0)
  dimension "d131" = 42
  dimension "d132" = 17
  dimension "d133" = 21
  dimension "d135" = 8.5
  dimension "d136" = 15.825
  dimension "d137" = 3.5
  dimension "d138" = 21
  dimension "d139" = 3.3
  dimension "d140" = 3.3
  dimension "d141" = 3.3
extrude "Extrusion22" cut sketch "Sketch29" against normal blind 10
sketch "Sketch30" plane through (0, 7.5, 0) normal (0, 1, 0) x (1, 0, 0)
  circle A0 centre (-7.175, -4) radius 1.65 projected
  circle A1 centre (-7.175, -4) radius 2.1021
  circle A2 centre (-24.175, -46) radius 1.65 projected
  circle A3 centre (-24.175, -46) radius 2.9173
  point P0 (0, 0)
extrude "Extrusion23" add sketch "Sketch30" against normal blind 7.5 contours A0 | A1 | A2 | A3
sketch "Sketch31" plane through (0, 7.5, 0) normal (0, 1, 0) x (1, 0, 0)
  point P0 (0, 0)
sketch "Sketch32" plane through (0, 0, 0) normal (0, -1, 0) x (1, 0, 0)
  point P0 (0, 0)
sketch "Sketch33" plane through (-306.6488, -2.5, -25) normal (0, -1, 0) x (1, 0, 0)
  line L0 (-6.8932, 105.4215) -> (129.1488, 105.4215)
  line L1 (129.1488, 105.4215) -> (129.1488, -38.7264)
  line L2 (129.1488, -38.7264) -> (-6.8932, -38.7264)
  line L3 (-6.8932, -38.7264) -> (-6.8932, 105.4215)
  point P0 (306.6488, 25)
extrude "Extrusion24" cut sketch "Sketch33" against normal blind 100
sketch "Sketch34" plane through (-177.5, 7.5, 0) normal (-1, 0, 0) x (0, 0, 1)
  line L0 (21.825, -7.5) -> (0, -7.5) construction
  line L1 (7.5, -7.5) -> (7.5, 0) construction
  line L2 (0, -7.5) -> (7.5, 0) construction
  line L3 (7.5, 0) -> (0, 0) construction
  line L4 (0, 0) -> (7.5, -7.5) construction
  line L5 (5.75, -5.75) -> (1.75, -5.75)
  line L6 (1.75, -5.75) -> (1.75, -1.75)
  line L7 (1.75, -1.75) -> (5.75, -1.75)
  line L8 (5.75, -1.75) -> (5.75, -5.75)
  line L9 (5.75, -5.75) -> (1.75, -1.75) construction
  line L10 (1.75, -5.75) -> (5.75, -1.75) construction
  line L11 (42.5, 0) -> (42.5, -7.5) construction
  line L12 (42.5, -3.75) -> (50, -3.75) construction
  line L13 (50, -7.5) -> (50, 0) construction
  line L14 (48.25, -5.75) -> (44.25, -5.75)
  line L15 (44.25, -5.75) -> (44.25, -1.75)
  line L16 (44.25, -1.75) -> (48.25, -1.75)
  line L17 (48.25, -1.75) -> (48.25, -5.75)
  line L18 (48.25, -5.75) -> (44.25, -1.75) construction
  line L19 (44.25, -5.75) -> (48.25, -1.75) construction
  point P0 (3.75, -3.75)
  point P1 (46.25, -3.75)
  dimension "d148" = 4
  dimension "d149" = 4
  dimension "d150" = 4
  dimension "d151" = 4
extrude "Extrusion25" add sketch "Sketch34" along normal blind 10
properties part number "mtv_frame(BrakeInFront)1-13 - FRONT"
